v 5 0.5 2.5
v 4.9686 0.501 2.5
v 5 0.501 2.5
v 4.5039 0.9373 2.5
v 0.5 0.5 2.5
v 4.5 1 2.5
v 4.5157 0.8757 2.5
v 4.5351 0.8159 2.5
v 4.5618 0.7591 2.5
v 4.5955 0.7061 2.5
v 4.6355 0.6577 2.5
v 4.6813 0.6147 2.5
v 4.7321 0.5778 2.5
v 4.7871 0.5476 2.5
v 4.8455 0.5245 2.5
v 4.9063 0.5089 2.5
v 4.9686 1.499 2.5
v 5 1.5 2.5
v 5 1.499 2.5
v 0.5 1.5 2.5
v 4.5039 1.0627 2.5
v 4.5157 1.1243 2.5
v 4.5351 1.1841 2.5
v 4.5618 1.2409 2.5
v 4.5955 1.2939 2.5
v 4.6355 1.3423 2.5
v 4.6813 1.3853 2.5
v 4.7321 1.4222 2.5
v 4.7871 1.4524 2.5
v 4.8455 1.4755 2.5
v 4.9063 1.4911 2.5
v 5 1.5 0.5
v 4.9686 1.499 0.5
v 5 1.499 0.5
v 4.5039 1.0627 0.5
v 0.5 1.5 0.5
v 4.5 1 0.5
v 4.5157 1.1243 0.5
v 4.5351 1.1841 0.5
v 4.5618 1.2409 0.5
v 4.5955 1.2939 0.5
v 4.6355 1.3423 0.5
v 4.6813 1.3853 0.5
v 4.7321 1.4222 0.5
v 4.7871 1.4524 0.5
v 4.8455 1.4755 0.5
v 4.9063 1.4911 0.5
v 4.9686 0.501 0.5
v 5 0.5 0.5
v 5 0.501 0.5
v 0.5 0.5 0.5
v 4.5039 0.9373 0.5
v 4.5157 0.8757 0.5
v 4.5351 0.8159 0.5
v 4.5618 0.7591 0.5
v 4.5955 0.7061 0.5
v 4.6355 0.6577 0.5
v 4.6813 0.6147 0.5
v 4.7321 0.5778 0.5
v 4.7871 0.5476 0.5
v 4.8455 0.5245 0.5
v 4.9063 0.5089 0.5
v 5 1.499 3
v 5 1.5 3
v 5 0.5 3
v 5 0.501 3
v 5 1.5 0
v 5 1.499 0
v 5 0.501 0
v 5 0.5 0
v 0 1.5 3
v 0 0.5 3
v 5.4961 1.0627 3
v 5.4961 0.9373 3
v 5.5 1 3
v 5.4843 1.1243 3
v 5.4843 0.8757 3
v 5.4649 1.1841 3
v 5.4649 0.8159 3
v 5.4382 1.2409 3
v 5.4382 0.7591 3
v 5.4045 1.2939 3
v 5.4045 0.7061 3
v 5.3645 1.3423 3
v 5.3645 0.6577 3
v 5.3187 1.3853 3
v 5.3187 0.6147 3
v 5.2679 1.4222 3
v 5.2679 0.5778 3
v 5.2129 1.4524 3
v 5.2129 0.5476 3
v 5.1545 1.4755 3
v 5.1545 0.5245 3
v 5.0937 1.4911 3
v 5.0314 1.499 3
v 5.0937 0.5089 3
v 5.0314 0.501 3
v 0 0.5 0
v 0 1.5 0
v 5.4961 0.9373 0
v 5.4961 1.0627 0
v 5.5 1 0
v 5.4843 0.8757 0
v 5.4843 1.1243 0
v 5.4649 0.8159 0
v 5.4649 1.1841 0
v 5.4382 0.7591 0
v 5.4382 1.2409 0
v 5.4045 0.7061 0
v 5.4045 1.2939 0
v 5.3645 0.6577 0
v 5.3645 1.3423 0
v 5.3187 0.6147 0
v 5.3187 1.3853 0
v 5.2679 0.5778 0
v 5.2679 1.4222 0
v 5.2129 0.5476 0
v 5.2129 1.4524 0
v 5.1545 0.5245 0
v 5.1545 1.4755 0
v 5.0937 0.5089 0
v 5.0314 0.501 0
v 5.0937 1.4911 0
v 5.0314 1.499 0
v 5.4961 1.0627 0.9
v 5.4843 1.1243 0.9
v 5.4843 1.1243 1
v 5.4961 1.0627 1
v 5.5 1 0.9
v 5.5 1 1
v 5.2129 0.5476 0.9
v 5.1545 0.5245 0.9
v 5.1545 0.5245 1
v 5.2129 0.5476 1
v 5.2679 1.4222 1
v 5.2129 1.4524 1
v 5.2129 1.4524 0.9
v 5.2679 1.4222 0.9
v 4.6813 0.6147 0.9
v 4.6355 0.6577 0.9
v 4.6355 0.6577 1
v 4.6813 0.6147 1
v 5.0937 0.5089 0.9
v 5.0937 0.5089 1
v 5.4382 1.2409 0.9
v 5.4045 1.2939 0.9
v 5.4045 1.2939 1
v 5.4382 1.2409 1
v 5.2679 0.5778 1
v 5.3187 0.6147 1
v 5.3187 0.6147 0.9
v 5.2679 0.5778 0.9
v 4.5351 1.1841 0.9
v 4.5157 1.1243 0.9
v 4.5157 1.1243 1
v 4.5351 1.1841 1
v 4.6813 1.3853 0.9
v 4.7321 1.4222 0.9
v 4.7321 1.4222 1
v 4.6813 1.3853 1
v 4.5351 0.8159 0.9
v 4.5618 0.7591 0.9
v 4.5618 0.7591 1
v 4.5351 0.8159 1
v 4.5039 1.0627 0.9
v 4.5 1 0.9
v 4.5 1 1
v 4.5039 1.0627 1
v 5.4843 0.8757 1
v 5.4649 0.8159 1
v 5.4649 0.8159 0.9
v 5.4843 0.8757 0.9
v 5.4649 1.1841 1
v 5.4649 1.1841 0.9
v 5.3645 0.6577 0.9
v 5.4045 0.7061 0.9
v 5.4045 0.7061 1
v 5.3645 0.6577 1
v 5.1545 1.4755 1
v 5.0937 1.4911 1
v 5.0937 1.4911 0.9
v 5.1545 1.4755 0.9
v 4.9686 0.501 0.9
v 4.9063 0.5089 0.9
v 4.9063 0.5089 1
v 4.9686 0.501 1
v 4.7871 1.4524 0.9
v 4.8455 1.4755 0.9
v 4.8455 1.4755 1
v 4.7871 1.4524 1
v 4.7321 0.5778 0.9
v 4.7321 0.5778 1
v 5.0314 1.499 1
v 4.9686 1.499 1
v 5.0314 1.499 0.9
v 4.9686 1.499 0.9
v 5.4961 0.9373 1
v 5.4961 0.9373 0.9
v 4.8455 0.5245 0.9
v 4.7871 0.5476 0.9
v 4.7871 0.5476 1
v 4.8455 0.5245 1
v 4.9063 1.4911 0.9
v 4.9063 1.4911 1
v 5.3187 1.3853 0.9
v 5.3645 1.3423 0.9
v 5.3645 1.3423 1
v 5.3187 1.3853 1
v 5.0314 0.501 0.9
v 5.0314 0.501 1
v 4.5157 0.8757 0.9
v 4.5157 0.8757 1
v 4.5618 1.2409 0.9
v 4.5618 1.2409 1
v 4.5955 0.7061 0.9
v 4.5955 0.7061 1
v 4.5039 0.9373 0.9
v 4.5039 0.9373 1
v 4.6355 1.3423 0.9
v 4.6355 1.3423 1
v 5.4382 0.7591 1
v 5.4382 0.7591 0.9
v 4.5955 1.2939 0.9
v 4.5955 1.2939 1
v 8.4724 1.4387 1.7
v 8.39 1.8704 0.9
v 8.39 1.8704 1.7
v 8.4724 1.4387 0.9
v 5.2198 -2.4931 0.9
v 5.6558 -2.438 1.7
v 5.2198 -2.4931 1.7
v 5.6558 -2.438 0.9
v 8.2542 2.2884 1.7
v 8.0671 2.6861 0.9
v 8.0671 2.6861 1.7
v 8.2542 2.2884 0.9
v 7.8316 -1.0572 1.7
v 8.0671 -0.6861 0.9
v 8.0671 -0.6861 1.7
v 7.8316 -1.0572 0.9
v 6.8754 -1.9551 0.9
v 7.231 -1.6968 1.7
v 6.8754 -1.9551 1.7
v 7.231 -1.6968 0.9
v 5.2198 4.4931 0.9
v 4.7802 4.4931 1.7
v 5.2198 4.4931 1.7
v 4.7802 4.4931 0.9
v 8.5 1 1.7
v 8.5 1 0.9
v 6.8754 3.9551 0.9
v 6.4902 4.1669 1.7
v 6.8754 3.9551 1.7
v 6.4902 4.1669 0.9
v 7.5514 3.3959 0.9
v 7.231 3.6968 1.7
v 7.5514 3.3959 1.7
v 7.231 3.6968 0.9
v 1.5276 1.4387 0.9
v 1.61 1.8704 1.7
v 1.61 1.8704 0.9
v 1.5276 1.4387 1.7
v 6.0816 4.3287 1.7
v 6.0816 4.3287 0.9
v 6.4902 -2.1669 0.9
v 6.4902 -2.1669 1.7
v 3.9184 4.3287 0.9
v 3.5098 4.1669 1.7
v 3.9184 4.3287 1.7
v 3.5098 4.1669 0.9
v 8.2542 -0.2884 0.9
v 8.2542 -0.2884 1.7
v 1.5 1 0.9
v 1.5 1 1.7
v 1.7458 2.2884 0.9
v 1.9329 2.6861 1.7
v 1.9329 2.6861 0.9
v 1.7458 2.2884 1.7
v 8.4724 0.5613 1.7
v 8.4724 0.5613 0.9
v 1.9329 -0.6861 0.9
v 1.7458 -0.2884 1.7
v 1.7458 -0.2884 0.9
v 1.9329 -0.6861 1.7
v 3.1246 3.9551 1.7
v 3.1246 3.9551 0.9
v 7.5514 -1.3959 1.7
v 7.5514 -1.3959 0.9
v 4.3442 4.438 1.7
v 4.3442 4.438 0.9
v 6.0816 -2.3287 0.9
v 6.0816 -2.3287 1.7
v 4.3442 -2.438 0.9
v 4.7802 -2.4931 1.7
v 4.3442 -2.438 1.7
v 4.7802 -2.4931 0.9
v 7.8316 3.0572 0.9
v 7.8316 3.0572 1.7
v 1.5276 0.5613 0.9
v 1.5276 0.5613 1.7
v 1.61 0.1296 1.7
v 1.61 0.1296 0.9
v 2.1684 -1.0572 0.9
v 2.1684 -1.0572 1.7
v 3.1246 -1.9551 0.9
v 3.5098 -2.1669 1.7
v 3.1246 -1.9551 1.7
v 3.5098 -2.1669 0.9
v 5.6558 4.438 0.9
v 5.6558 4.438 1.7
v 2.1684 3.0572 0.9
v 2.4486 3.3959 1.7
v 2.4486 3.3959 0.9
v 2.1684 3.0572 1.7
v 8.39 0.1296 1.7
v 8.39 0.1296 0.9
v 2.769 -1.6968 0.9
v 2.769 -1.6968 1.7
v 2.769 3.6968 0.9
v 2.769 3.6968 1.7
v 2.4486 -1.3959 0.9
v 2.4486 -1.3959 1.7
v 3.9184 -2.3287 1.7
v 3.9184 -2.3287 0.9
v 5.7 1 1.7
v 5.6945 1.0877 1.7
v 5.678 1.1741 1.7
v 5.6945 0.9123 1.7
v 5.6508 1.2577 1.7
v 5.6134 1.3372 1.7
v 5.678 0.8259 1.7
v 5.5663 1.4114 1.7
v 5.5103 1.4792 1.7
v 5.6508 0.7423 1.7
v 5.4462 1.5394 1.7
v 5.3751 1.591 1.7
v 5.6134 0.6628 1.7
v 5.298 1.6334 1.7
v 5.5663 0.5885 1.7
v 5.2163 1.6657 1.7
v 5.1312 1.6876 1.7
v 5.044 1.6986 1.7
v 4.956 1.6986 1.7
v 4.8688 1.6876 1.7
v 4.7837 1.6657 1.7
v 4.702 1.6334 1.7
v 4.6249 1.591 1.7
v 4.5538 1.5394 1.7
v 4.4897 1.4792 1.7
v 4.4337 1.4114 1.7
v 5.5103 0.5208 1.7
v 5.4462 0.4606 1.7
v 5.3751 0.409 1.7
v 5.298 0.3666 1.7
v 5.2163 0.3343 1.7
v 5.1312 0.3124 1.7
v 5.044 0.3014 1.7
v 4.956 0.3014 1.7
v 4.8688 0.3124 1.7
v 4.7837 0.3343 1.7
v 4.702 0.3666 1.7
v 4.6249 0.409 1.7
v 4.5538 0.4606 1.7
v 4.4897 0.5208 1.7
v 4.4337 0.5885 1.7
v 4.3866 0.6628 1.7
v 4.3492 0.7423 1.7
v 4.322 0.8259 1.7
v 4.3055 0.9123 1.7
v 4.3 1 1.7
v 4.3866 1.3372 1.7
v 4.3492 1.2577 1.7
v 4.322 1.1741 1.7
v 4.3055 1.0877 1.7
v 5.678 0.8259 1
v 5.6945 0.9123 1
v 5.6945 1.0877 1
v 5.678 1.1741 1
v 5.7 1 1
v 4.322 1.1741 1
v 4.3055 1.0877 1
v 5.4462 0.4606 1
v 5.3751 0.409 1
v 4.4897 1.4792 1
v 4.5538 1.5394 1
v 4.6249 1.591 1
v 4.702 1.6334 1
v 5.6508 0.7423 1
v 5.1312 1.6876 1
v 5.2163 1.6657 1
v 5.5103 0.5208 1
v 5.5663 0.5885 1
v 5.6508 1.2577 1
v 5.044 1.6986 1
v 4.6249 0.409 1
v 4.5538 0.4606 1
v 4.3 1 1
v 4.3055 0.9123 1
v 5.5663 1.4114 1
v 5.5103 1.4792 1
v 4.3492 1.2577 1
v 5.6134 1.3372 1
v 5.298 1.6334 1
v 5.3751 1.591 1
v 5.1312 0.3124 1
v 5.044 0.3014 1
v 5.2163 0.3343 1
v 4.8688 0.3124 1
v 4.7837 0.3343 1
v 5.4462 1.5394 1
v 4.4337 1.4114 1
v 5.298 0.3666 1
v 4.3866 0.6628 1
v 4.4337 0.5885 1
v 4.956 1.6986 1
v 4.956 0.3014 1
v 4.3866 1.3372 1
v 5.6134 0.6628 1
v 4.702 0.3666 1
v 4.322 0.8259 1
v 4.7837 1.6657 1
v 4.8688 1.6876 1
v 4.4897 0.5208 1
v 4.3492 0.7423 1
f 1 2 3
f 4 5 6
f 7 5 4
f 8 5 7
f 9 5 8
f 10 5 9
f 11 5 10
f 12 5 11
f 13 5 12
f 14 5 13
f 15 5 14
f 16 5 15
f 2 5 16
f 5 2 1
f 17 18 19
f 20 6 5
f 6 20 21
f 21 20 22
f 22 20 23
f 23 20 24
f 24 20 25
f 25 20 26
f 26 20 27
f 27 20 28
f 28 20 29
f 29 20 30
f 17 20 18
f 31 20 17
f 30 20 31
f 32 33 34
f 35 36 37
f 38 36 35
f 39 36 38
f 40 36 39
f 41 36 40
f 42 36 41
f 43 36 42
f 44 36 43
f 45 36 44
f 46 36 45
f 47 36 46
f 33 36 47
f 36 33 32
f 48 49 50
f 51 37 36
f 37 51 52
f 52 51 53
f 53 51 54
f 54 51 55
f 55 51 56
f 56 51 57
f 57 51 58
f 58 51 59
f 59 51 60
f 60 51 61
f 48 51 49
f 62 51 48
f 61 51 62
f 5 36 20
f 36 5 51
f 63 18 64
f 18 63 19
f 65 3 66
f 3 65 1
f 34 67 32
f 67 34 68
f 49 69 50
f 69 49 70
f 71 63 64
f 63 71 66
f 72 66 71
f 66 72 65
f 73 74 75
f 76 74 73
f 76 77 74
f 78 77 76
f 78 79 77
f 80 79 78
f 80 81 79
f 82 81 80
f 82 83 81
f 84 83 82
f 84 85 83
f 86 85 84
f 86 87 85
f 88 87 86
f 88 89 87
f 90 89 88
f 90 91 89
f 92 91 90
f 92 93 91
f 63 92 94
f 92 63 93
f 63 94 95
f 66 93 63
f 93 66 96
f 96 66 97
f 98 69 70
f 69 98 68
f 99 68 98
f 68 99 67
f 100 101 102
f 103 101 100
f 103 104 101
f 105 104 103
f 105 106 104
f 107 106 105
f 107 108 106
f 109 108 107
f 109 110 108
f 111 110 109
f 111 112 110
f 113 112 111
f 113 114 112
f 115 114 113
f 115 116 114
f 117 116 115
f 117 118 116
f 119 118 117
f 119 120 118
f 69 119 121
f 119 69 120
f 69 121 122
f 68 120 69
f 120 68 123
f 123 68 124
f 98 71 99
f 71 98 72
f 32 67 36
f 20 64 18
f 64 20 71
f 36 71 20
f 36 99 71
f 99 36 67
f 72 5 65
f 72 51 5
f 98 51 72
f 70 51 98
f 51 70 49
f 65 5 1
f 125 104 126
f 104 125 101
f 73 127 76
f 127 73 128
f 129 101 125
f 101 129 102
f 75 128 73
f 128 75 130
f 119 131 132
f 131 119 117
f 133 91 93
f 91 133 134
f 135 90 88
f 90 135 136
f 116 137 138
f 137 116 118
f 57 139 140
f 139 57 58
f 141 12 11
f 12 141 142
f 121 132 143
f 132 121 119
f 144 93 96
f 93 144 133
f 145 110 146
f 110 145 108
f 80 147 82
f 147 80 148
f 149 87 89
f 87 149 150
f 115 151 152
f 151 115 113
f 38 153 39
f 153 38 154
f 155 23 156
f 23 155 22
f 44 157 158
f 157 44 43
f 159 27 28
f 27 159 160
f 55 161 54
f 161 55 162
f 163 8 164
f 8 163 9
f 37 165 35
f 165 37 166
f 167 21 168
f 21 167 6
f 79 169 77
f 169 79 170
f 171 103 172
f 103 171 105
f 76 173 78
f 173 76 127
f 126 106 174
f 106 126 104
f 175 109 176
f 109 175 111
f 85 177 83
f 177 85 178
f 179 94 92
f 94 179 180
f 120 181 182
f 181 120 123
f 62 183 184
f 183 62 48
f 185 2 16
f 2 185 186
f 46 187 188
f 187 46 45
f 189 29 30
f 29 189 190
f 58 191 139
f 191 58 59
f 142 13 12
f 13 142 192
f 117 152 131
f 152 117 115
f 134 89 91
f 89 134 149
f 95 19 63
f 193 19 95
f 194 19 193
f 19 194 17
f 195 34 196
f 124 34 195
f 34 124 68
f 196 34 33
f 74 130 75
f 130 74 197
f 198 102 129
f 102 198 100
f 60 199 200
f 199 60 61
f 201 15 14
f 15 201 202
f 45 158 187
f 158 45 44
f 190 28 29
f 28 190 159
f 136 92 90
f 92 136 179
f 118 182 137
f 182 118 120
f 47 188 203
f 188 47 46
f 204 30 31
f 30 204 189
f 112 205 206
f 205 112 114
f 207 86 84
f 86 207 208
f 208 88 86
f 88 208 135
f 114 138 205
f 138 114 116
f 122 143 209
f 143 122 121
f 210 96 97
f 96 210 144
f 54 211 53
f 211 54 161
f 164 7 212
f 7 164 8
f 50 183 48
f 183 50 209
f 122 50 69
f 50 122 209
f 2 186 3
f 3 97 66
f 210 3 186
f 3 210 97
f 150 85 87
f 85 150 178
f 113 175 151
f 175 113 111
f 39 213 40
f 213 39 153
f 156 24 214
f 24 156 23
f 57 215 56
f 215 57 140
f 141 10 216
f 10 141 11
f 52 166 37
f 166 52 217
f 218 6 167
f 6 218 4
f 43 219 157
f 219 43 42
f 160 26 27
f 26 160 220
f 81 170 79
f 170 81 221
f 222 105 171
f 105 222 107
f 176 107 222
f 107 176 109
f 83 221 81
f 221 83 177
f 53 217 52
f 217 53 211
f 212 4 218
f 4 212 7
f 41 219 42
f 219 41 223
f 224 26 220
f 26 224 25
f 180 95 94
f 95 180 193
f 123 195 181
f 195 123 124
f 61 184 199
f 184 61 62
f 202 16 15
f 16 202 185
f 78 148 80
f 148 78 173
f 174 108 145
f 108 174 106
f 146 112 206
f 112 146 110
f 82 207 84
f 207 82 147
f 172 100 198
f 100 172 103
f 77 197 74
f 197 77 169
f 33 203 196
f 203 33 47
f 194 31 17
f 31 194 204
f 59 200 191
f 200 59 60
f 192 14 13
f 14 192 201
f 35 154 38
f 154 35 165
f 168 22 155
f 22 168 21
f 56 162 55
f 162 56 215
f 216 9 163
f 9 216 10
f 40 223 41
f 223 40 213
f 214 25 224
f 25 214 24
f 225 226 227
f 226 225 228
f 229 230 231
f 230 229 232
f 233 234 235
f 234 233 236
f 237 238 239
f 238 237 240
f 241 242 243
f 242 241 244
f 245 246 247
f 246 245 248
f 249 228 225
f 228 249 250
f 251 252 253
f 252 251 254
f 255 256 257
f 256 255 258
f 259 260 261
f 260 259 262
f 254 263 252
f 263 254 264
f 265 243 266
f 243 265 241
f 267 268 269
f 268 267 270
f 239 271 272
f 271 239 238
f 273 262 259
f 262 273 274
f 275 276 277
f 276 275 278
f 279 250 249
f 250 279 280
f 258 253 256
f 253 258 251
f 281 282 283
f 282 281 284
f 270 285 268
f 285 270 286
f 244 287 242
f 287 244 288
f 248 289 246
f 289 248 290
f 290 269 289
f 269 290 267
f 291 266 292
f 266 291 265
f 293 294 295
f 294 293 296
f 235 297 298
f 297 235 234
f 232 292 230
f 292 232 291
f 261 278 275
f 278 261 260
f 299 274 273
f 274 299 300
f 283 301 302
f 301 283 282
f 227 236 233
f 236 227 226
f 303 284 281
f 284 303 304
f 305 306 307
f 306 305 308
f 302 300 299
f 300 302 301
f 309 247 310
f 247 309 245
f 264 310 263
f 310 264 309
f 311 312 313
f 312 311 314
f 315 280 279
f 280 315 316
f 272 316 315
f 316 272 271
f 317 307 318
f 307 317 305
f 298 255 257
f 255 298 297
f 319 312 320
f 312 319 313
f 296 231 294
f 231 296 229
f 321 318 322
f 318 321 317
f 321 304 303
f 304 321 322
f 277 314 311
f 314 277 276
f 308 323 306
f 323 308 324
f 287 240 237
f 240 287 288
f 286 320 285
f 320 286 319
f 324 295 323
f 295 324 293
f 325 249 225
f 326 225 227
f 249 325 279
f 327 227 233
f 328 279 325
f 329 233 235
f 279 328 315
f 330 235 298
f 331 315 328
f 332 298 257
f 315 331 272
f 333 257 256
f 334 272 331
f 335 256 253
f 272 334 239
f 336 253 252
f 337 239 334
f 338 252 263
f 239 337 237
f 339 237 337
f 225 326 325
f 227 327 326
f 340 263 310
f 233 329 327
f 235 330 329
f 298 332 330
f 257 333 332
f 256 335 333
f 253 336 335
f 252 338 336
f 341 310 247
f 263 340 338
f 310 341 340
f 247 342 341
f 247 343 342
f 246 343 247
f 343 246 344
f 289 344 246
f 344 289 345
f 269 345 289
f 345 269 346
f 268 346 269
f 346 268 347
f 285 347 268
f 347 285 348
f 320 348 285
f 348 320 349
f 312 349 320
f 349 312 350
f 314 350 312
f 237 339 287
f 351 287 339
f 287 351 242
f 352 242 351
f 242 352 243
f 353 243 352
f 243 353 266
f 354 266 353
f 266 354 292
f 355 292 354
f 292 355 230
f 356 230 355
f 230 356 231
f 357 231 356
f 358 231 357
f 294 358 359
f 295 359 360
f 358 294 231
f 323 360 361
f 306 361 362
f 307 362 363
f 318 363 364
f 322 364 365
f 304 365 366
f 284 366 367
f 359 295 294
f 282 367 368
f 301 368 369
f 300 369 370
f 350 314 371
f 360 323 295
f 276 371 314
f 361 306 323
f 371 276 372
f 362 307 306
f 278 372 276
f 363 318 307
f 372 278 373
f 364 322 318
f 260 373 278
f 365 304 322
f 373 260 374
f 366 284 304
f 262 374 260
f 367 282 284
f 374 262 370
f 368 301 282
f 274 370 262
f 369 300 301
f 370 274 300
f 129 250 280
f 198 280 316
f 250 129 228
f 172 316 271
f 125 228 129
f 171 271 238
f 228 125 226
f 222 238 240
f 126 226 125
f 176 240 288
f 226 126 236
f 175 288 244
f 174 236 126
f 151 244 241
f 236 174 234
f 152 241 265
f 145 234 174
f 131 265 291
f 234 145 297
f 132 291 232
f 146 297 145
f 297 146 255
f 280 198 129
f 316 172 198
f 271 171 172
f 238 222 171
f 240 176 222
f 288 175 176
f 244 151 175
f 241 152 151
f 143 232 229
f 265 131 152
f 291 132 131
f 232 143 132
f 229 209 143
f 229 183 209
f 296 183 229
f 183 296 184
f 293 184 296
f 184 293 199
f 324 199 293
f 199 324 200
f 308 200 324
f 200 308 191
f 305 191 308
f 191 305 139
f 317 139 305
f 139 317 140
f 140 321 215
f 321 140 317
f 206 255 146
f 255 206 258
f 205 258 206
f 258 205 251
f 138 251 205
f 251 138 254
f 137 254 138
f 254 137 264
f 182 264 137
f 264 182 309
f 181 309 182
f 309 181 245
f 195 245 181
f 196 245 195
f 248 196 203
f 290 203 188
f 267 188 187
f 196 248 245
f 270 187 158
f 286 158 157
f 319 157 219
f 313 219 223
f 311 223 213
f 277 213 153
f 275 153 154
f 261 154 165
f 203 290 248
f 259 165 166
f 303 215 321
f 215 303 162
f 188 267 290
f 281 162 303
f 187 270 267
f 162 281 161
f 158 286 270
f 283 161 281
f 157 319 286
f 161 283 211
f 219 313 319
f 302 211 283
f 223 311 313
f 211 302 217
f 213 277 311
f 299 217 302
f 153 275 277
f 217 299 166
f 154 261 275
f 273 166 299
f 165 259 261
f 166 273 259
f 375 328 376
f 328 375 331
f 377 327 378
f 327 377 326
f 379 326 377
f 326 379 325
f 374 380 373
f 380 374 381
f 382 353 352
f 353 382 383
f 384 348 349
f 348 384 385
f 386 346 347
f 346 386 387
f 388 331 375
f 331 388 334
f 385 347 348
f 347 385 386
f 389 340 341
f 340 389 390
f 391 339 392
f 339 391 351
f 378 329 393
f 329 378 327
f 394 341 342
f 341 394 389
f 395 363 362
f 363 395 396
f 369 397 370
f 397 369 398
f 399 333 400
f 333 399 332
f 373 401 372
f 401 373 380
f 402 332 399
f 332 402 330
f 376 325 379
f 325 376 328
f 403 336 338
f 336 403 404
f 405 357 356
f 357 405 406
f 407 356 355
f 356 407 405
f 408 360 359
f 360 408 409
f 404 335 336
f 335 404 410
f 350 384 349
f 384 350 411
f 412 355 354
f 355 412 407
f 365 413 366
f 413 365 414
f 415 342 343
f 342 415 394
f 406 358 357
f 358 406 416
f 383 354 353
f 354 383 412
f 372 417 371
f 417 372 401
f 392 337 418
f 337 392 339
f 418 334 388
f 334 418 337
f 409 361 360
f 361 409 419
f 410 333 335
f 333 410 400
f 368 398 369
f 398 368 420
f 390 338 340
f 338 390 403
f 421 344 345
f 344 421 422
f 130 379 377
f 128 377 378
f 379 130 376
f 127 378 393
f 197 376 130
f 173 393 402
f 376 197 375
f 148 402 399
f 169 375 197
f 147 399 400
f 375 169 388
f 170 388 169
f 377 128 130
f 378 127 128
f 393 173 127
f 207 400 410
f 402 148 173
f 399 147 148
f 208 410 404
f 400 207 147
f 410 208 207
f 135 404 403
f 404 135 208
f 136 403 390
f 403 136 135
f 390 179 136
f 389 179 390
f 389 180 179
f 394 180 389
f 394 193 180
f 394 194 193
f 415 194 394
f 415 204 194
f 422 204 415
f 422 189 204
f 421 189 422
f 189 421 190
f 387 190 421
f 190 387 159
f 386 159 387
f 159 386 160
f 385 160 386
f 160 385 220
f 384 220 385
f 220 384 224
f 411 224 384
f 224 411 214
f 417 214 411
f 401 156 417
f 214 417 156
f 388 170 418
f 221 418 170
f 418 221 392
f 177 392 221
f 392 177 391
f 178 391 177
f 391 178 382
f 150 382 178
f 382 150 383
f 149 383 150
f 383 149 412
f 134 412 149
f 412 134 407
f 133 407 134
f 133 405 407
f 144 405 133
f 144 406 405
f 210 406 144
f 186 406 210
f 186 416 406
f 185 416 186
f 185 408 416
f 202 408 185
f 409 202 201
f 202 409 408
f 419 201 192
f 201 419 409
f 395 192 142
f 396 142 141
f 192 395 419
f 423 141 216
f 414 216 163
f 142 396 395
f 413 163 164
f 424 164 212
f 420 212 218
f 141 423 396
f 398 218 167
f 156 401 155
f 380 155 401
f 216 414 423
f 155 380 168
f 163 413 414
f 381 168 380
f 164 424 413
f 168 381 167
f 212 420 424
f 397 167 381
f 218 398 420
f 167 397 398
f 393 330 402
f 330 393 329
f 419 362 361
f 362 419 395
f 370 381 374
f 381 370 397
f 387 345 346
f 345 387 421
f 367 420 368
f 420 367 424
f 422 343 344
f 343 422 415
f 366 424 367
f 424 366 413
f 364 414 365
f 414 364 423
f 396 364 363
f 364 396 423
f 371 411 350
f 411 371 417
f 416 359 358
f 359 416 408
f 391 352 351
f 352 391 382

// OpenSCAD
module inner(){
 	translate([-.5,0,0])
 		cube([8,8,2]);
 	cube([9,7,2]);
 }
 
 module box(){

	translate([0,0.5,0])
 	difference(){
 		cube([5,1,3]);
 
 		translate([1,-0.5,0.5])
 			inner();
 	}
 	
 	translate([5,1,0])
 		cylinder(r=0.5, h=3, $fn=50);
 }
 
 module roller(){
 	difference(){
 		//color("red")
 			translate([5,1,0.9])
 			cylinder(r=3.5, h=0.8, $fn=50);
 
 		translate([5,1,1])
 			cylinder(r=0.7, h=3, $fn=50);
 	}
 }
 
 module vex(){
 	translate([5, 1, 1.5])
 		for( i = [0:5] ){
 
 			rotate(i*360/6, [0,0,1])
 			translate([0, 3, 0])
 			cylinder(r=0.4, h=0.5, $fn=50);
 	}
 }
 
 box();
 roller();
 //vex();
